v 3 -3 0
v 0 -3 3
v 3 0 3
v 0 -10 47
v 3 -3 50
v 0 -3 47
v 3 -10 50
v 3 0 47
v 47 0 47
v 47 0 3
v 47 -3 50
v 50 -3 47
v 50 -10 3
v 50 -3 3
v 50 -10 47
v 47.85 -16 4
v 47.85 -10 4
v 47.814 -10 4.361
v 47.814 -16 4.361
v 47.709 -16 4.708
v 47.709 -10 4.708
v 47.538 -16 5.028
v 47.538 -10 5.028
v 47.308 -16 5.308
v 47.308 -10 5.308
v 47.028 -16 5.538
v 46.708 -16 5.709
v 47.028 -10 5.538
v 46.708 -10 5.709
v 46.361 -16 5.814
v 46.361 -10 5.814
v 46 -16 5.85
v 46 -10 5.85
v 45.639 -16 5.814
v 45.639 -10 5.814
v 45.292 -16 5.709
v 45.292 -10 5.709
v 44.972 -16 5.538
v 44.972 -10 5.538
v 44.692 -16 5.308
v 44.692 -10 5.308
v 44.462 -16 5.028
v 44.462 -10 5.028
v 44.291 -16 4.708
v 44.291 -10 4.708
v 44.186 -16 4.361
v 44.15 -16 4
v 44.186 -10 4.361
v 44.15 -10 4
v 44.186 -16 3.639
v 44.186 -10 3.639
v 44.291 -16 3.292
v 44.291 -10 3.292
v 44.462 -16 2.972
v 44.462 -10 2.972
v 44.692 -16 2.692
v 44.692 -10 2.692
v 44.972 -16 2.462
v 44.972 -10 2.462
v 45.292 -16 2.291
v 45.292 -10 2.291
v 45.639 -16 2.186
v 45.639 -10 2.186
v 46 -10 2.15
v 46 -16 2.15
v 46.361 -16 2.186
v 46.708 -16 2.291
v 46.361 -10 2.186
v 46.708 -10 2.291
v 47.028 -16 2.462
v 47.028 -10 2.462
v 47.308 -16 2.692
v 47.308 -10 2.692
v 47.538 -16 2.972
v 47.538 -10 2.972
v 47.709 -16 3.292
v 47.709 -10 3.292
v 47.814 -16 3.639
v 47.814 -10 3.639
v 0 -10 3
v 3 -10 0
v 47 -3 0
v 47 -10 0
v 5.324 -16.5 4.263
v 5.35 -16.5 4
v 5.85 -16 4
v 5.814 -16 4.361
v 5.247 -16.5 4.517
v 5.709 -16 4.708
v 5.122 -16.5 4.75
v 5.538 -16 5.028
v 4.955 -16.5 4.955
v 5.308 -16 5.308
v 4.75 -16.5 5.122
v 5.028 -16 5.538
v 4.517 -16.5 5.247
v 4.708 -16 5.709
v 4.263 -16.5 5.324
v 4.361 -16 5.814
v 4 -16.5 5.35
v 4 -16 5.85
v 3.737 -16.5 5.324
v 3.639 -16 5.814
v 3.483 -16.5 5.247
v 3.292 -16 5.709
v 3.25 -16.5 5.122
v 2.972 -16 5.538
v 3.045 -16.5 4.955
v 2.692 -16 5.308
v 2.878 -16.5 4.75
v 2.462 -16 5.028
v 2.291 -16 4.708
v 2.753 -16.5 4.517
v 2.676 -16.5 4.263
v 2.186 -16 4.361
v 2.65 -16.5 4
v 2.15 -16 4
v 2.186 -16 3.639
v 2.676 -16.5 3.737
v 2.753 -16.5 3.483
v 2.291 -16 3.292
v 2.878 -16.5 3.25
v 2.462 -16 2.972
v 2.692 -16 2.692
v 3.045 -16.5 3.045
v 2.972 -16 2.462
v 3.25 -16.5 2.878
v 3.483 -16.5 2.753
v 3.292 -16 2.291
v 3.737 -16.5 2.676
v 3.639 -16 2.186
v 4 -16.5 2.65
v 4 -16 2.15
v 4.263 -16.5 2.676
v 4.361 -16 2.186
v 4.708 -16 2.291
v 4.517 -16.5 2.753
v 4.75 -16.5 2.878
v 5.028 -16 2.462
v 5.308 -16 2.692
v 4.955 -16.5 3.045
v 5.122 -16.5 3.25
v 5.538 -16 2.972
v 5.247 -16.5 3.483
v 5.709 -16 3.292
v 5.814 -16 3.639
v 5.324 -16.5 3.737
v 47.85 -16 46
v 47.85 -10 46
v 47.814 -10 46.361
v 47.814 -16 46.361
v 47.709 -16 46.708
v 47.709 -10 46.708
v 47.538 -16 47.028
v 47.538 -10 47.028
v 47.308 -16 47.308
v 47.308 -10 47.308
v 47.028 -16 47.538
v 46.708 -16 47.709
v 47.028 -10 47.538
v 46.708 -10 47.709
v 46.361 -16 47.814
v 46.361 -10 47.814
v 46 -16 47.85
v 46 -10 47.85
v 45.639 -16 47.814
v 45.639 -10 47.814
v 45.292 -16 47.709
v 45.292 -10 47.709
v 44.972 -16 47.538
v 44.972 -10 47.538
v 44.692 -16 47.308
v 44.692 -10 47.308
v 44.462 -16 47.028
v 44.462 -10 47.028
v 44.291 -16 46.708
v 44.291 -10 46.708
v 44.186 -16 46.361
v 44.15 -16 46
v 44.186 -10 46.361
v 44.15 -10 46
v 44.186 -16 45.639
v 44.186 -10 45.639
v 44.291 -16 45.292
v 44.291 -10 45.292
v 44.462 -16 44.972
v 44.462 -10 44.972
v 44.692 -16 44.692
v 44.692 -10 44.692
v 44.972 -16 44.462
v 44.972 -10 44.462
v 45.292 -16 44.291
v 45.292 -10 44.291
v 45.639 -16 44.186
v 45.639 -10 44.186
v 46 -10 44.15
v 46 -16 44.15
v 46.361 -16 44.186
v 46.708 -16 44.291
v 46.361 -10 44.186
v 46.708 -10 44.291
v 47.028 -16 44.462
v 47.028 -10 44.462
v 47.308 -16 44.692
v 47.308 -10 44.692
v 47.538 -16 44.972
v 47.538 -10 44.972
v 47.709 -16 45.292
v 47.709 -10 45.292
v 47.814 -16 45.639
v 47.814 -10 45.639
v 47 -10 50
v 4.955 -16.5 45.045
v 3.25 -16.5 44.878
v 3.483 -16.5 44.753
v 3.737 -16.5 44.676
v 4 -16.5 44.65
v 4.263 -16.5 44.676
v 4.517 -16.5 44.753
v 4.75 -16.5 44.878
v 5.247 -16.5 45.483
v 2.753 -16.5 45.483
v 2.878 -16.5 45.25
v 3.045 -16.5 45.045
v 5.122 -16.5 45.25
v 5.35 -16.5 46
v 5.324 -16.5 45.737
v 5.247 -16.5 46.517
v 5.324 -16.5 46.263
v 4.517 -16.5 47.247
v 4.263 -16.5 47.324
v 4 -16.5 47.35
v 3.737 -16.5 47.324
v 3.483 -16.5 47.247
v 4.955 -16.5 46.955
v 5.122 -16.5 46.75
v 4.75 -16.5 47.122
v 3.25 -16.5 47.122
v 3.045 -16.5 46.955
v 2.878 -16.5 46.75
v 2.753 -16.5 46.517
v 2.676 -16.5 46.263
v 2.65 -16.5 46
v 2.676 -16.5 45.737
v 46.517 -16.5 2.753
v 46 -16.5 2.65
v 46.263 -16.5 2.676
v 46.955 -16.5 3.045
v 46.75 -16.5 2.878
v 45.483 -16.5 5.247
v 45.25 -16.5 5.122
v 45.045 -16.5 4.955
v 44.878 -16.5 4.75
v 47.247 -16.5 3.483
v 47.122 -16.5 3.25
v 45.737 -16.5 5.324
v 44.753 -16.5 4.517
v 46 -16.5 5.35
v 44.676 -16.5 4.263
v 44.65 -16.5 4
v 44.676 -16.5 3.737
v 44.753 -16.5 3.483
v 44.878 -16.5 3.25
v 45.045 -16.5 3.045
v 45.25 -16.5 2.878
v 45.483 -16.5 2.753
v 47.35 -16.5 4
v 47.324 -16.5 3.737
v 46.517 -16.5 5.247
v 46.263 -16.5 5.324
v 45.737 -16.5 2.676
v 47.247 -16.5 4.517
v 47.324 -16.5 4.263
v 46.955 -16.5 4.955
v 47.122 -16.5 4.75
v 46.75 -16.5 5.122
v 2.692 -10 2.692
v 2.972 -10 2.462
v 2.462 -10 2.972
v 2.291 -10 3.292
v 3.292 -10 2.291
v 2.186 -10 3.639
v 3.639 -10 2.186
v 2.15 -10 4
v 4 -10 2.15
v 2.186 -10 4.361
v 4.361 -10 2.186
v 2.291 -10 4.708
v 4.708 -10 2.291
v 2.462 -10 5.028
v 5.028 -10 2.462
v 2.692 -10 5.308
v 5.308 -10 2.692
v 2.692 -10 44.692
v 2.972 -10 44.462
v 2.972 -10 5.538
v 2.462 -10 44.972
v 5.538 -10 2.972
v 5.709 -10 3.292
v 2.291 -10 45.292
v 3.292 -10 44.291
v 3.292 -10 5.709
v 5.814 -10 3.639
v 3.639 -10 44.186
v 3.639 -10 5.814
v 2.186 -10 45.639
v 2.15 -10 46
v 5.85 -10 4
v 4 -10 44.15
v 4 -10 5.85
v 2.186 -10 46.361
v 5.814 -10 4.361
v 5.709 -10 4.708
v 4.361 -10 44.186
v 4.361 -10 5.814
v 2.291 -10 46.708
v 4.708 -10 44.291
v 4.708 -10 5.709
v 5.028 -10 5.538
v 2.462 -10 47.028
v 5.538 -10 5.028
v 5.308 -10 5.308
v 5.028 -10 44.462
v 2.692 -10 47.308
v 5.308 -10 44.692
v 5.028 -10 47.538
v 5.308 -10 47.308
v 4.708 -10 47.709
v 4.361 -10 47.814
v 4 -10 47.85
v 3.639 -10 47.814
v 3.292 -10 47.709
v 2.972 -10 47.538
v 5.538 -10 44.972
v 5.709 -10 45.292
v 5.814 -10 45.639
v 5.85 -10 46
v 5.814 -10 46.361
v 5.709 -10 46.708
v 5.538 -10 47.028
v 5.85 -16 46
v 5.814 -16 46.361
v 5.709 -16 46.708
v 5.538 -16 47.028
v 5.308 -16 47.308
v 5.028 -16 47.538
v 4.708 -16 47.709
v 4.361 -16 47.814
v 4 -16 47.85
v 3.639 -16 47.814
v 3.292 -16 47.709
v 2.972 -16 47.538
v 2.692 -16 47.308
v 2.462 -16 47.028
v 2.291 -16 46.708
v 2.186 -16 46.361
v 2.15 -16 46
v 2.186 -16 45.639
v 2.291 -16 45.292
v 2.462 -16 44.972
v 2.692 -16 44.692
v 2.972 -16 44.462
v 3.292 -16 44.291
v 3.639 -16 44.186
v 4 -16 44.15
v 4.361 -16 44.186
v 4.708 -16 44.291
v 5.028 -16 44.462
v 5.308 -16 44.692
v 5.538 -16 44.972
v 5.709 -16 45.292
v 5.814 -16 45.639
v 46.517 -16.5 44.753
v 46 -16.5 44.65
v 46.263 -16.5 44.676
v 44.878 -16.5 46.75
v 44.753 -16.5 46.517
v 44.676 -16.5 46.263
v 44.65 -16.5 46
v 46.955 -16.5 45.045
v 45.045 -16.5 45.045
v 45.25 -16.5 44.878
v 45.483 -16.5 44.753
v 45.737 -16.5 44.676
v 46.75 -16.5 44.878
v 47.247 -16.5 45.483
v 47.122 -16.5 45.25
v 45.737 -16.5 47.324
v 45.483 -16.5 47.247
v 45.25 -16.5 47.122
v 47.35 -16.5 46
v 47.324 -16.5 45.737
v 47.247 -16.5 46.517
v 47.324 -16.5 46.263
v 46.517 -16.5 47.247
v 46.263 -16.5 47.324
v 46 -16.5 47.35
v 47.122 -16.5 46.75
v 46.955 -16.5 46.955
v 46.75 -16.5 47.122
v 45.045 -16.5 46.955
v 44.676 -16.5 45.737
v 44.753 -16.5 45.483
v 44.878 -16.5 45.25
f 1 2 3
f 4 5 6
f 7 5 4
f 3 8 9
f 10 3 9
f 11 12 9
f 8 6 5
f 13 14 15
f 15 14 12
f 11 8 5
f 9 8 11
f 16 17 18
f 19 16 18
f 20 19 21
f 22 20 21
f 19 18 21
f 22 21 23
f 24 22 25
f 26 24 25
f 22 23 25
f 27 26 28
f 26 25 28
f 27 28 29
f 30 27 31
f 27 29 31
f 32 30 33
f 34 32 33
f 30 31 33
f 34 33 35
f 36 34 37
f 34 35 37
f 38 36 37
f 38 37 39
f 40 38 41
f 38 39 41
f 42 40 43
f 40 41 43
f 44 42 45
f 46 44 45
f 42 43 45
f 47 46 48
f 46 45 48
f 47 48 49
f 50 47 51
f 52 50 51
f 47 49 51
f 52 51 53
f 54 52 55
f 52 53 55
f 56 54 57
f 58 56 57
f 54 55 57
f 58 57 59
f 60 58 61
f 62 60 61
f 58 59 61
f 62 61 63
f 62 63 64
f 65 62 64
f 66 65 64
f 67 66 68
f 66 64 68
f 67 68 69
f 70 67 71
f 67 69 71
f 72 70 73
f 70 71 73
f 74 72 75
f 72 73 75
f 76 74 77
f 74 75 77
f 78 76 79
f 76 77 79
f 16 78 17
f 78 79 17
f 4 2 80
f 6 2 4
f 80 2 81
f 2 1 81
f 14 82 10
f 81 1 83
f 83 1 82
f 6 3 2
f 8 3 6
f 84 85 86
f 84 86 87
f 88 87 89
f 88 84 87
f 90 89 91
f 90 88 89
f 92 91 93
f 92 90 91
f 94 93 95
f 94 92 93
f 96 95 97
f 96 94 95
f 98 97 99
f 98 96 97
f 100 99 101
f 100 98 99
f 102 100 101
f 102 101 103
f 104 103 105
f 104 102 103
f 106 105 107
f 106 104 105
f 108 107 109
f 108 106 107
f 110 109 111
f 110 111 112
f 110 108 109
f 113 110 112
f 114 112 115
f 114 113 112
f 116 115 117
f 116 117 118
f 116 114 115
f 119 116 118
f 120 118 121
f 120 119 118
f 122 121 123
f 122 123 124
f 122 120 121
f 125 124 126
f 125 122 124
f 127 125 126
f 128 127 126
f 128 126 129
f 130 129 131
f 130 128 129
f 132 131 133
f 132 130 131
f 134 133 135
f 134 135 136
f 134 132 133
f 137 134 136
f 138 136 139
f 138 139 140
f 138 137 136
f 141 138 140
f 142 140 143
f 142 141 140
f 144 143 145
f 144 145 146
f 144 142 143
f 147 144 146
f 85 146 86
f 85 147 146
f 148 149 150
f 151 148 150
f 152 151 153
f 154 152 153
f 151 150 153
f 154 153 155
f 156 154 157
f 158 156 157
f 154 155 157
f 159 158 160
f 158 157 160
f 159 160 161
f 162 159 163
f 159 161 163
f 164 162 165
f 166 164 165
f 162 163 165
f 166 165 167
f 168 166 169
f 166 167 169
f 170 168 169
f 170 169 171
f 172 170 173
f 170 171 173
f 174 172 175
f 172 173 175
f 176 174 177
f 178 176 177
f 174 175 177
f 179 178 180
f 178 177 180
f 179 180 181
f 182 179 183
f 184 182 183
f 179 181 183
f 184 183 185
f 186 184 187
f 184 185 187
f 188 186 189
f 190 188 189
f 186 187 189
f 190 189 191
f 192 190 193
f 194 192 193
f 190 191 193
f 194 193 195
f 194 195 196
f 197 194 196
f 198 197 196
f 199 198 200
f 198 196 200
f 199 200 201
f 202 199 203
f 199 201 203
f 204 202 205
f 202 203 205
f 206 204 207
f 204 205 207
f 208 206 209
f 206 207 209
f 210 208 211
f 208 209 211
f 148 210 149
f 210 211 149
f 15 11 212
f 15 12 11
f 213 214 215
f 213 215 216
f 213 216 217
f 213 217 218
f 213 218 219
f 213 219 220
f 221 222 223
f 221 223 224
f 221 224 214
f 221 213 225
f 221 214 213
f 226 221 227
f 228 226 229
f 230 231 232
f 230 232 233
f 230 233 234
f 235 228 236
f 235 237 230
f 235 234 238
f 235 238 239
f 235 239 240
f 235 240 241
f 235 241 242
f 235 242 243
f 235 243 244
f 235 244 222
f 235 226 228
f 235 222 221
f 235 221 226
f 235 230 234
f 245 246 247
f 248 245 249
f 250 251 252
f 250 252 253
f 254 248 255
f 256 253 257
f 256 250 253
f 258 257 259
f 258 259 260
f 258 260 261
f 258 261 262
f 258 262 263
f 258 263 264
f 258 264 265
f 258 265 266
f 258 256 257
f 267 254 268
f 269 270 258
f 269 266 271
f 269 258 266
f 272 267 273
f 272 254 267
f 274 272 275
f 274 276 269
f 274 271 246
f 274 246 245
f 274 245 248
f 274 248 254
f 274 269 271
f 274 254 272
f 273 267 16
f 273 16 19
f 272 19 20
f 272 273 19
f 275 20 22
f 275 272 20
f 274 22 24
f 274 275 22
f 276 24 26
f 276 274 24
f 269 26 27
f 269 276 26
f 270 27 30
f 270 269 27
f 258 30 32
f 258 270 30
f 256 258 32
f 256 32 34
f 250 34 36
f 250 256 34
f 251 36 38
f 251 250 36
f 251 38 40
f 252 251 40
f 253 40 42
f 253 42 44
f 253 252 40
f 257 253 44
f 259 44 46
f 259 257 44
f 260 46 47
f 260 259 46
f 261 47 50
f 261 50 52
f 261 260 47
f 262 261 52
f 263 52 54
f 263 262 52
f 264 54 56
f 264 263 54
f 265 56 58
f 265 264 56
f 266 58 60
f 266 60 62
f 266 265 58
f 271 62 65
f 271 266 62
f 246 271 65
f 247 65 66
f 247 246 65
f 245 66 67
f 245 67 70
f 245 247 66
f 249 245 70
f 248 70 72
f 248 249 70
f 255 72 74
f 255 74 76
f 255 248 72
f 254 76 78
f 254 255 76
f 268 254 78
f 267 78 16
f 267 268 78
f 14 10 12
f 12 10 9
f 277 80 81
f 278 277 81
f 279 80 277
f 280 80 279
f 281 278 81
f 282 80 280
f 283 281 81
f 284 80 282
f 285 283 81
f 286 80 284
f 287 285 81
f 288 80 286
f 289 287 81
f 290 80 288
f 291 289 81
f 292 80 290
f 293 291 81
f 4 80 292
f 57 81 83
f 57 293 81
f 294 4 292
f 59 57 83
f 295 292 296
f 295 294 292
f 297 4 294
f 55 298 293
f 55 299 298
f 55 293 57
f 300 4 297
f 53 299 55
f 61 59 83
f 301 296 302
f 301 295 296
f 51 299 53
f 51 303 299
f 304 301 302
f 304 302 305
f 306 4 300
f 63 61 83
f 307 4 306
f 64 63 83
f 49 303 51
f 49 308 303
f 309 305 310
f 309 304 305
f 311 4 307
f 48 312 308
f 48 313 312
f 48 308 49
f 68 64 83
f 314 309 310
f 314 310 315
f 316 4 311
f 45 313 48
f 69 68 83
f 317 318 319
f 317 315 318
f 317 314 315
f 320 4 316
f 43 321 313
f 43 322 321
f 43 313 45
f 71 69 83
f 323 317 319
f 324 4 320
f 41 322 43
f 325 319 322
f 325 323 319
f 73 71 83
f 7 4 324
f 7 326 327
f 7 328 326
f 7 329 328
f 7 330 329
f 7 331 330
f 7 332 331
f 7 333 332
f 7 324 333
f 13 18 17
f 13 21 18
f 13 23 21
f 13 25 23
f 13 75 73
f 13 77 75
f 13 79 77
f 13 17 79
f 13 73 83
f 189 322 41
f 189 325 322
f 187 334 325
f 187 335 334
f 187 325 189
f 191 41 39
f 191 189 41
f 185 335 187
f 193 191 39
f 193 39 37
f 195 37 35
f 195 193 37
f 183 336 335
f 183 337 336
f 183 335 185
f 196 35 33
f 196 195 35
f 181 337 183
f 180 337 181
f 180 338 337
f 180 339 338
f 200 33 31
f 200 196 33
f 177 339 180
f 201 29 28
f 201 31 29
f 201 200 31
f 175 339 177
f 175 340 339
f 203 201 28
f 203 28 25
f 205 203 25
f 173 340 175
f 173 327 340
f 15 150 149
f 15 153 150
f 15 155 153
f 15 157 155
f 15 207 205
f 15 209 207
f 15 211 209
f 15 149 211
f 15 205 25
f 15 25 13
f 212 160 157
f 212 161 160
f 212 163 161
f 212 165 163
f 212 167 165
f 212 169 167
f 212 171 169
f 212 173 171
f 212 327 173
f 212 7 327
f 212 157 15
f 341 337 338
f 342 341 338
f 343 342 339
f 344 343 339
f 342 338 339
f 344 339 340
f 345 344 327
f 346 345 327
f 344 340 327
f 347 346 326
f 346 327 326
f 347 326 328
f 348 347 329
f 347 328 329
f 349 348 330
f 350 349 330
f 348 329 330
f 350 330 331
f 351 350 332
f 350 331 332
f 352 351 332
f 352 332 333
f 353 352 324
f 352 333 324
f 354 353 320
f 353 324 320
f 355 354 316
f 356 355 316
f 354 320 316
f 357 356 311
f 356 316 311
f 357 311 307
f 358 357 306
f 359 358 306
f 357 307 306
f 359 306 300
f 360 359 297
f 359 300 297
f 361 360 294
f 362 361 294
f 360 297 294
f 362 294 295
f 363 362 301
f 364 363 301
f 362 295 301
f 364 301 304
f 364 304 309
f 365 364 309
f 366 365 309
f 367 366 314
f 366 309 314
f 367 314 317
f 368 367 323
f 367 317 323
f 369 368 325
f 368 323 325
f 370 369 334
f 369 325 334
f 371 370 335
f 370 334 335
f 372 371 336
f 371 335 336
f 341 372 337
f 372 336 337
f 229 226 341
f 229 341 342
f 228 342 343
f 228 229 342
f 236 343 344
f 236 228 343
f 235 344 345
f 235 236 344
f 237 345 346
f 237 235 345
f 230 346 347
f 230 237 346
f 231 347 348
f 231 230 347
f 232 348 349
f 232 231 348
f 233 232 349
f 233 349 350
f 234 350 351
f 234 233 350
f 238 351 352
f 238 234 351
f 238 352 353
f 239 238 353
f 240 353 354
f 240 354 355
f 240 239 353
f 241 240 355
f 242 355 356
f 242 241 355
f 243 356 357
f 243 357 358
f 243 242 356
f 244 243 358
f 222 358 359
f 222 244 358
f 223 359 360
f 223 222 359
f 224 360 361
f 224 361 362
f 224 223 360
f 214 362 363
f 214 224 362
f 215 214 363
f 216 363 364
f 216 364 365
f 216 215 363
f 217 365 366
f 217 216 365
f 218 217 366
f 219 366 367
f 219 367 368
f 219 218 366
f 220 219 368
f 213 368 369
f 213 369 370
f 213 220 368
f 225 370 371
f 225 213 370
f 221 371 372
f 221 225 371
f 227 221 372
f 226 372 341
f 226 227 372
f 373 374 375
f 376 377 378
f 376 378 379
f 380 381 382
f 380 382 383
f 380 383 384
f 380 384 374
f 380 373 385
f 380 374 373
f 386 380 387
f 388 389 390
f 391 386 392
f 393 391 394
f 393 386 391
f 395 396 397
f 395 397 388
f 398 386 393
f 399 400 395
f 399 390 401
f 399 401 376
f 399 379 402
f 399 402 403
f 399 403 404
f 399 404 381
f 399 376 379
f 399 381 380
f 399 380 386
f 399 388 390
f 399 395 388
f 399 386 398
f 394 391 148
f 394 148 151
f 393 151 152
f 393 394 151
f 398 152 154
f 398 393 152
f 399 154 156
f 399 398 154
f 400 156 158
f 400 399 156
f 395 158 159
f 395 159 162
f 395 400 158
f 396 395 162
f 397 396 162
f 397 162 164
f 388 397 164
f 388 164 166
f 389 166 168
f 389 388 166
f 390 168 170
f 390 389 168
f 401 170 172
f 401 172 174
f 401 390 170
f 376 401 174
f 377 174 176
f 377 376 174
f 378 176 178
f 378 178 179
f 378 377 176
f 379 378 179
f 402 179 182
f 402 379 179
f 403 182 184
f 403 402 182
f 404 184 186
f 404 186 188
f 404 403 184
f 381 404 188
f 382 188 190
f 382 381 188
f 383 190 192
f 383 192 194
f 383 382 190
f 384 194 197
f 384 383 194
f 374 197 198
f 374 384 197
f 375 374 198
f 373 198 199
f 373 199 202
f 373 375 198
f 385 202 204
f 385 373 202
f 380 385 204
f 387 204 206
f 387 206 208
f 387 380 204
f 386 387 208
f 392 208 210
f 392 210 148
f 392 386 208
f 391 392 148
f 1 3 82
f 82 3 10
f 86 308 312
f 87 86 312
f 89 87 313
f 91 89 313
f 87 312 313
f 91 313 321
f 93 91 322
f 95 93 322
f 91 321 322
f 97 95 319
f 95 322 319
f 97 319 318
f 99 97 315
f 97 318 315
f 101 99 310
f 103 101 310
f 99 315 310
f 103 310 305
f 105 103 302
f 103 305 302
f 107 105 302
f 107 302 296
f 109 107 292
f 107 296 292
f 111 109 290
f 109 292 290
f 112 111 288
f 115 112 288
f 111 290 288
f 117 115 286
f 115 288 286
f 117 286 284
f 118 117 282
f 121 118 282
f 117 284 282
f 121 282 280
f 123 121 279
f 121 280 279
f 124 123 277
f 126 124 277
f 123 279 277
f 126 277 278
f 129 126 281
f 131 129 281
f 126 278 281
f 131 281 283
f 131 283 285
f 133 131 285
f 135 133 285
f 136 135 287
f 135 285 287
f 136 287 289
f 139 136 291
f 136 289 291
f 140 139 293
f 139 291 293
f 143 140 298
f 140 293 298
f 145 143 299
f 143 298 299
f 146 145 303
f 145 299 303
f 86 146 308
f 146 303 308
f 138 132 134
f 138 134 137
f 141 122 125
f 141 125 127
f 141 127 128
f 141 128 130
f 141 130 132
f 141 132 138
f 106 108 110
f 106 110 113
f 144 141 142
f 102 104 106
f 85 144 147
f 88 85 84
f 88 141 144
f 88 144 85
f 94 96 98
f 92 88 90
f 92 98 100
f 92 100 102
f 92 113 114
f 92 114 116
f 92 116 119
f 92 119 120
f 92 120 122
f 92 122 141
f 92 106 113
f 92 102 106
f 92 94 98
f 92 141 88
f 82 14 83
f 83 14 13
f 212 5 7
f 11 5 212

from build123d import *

# Parameters (mm, degrees)
F0_W     = 50
F0_H     = 50
F1_DEPTH = 10
F2_R     = 1.85
F3_DEPTH = 6.5
F4_SIZE  = 0.5
F5_SIZE  = 3


with BuildPart() as f1:
    # F0 (on Front) → F1 (new body)
    with BuildSketch(Plane.XZ):
        with Locations((25, 25)):
            Rectangle(F0_W, F0_H)
    extrude(amount=F1_DEPTH)

    # F2 (on face) → F3 (join)
    with BuildSketch(Plane.XZ.offset(10)):
        with Locations((4, 46)):
            Circle(F2_R)
        with Locations((46, 46)):
            Circle(F2_R)
        with Locations((46, 4)):
            Circle(F2_R)
        with Locations((4, 4)):
            Circle(F2_R)
    extrude(amount=F3_DEPTH)

    # F4
    f4_edges = [f1.edges().sort_by_distance(p)[0] for p in [
        (2.15, -16.5, 4),
        (44.15, -16.5, 4),
        (44.15, -16.5, 46),
        (2.15, -16.5, 46),
    ]]
    chamfer(f4_edges, length=F4_SIZE)

    # F5
    f5_edges = [f1.edges().sort_by_distance(p)[0] for p in [
        (0, -5, 50),
        (50, -5, 50),
        (50, -5, 0),
        (0, -5, 0),
        (0, 0, 25),
        (25, 0, 0),
        (50, 0, 25),
        (25, 0, 50),
    ]]
    chamfer(f5_edges, length=F5_SIZE)


solid = f1.part
